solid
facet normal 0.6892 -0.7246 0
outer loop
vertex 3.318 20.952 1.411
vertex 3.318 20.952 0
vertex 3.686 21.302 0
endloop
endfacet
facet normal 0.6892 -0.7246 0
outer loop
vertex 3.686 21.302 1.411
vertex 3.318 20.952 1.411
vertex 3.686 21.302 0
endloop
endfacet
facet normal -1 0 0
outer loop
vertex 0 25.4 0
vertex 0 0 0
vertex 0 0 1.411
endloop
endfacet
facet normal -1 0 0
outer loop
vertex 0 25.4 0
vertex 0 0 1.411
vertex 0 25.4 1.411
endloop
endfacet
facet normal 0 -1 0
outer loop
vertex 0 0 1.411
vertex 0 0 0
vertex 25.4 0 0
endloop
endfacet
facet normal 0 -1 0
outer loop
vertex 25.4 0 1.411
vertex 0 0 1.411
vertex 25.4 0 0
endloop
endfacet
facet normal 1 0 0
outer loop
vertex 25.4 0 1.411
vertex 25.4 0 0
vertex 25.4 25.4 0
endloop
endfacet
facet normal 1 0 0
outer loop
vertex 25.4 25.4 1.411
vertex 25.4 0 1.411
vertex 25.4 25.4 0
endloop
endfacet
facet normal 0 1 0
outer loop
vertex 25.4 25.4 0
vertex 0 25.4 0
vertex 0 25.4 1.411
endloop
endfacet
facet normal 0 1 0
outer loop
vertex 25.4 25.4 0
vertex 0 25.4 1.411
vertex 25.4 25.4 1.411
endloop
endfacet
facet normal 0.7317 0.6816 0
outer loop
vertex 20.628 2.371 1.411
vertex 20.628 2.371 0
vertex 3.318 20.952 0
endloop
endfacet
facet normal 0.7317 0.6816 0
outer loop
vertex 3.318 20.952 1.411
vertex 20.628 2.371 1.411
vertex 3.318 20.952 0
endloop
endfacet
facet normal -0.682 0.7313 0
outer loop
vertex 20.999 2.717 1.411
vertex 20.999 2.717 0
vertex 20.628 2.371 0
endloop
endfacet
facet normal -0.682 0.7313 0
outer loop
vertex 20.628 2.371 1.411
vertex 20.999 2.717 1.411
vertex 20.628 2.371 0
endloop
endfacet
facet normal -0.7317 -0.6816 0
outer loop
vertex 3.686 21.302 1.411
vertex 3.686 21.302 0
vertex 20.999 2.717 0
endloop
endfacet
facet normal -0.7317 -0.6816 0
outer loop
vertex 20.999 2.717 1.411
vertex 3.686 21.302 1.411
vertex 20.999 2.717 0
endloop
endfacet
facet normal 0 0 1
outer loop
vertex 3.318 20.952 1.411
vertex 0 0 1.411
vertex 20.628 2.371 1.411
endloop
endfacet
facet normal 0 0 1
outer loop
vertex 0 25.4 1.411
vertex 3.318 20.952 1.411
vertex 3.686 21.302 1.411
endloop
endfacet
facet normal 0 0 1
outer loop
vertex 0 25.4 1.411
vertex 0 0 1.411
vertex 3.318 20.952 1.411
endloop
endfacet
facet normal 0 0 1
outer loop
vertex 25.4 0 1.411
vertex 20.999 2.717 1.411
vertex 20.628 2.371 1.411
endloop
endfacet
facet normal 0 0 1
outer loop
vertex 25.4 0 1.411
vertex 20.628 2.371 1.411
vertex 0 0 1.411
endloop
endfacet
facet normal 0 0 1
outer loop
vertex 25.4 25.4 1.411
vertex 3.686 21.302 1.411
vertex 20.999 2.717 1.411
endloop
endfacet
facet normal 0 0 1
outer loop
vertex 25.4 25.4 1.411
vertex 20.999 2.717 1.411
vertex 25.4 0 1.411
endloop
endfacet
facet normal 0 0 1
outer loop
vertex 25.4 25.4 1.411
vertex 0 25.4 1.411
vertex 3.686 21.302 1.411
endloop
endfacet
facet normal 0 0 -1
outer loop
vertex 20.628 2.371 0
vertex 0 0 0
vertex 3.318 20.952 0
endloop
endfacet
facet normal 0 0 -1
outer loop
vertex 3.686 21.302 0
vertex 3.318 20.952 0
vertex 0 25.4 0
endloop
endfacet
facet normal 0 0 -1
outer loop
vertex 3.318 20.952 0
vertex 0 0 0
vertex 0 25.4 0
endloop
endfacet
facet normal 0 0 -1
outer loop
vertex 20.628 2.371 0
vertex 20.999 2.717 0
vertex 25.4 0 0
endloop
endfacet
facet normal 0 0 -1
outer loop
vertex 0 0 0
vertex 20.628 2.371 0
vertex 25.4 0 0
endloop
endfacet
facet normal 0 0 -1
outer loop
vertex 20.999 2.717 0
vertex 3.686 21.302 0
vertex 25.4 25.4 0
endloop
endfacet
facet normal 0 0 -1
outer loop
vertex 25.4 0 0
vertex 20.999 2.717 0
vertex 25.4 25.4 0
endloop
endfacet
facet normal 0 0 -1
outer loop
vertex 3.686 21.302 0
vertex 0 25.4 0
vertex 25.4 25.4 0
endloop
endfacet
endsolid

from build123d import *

# Parameters (mm, degrees)
F0_W     = 25.4
F0_H     = 25.4
F1_DEPTH = 1.411111


with BuildPart() as f1:
    # F0 (on Top) → F1 (new body)
    with BuildSketch(Plane.XY):
        with Locations((12.7, 12.7)):
            Rectangle(F0_W, F0_H)
        Polygon((20.627546, 2.370901), (3.317771, 20.952014), (3.685775, 21.30221), (20.999226, 2.717151), align=None, mode=Mode.SUBTRACT)
    extrude(amount=F1_DEPTH)


solid = f1.part
